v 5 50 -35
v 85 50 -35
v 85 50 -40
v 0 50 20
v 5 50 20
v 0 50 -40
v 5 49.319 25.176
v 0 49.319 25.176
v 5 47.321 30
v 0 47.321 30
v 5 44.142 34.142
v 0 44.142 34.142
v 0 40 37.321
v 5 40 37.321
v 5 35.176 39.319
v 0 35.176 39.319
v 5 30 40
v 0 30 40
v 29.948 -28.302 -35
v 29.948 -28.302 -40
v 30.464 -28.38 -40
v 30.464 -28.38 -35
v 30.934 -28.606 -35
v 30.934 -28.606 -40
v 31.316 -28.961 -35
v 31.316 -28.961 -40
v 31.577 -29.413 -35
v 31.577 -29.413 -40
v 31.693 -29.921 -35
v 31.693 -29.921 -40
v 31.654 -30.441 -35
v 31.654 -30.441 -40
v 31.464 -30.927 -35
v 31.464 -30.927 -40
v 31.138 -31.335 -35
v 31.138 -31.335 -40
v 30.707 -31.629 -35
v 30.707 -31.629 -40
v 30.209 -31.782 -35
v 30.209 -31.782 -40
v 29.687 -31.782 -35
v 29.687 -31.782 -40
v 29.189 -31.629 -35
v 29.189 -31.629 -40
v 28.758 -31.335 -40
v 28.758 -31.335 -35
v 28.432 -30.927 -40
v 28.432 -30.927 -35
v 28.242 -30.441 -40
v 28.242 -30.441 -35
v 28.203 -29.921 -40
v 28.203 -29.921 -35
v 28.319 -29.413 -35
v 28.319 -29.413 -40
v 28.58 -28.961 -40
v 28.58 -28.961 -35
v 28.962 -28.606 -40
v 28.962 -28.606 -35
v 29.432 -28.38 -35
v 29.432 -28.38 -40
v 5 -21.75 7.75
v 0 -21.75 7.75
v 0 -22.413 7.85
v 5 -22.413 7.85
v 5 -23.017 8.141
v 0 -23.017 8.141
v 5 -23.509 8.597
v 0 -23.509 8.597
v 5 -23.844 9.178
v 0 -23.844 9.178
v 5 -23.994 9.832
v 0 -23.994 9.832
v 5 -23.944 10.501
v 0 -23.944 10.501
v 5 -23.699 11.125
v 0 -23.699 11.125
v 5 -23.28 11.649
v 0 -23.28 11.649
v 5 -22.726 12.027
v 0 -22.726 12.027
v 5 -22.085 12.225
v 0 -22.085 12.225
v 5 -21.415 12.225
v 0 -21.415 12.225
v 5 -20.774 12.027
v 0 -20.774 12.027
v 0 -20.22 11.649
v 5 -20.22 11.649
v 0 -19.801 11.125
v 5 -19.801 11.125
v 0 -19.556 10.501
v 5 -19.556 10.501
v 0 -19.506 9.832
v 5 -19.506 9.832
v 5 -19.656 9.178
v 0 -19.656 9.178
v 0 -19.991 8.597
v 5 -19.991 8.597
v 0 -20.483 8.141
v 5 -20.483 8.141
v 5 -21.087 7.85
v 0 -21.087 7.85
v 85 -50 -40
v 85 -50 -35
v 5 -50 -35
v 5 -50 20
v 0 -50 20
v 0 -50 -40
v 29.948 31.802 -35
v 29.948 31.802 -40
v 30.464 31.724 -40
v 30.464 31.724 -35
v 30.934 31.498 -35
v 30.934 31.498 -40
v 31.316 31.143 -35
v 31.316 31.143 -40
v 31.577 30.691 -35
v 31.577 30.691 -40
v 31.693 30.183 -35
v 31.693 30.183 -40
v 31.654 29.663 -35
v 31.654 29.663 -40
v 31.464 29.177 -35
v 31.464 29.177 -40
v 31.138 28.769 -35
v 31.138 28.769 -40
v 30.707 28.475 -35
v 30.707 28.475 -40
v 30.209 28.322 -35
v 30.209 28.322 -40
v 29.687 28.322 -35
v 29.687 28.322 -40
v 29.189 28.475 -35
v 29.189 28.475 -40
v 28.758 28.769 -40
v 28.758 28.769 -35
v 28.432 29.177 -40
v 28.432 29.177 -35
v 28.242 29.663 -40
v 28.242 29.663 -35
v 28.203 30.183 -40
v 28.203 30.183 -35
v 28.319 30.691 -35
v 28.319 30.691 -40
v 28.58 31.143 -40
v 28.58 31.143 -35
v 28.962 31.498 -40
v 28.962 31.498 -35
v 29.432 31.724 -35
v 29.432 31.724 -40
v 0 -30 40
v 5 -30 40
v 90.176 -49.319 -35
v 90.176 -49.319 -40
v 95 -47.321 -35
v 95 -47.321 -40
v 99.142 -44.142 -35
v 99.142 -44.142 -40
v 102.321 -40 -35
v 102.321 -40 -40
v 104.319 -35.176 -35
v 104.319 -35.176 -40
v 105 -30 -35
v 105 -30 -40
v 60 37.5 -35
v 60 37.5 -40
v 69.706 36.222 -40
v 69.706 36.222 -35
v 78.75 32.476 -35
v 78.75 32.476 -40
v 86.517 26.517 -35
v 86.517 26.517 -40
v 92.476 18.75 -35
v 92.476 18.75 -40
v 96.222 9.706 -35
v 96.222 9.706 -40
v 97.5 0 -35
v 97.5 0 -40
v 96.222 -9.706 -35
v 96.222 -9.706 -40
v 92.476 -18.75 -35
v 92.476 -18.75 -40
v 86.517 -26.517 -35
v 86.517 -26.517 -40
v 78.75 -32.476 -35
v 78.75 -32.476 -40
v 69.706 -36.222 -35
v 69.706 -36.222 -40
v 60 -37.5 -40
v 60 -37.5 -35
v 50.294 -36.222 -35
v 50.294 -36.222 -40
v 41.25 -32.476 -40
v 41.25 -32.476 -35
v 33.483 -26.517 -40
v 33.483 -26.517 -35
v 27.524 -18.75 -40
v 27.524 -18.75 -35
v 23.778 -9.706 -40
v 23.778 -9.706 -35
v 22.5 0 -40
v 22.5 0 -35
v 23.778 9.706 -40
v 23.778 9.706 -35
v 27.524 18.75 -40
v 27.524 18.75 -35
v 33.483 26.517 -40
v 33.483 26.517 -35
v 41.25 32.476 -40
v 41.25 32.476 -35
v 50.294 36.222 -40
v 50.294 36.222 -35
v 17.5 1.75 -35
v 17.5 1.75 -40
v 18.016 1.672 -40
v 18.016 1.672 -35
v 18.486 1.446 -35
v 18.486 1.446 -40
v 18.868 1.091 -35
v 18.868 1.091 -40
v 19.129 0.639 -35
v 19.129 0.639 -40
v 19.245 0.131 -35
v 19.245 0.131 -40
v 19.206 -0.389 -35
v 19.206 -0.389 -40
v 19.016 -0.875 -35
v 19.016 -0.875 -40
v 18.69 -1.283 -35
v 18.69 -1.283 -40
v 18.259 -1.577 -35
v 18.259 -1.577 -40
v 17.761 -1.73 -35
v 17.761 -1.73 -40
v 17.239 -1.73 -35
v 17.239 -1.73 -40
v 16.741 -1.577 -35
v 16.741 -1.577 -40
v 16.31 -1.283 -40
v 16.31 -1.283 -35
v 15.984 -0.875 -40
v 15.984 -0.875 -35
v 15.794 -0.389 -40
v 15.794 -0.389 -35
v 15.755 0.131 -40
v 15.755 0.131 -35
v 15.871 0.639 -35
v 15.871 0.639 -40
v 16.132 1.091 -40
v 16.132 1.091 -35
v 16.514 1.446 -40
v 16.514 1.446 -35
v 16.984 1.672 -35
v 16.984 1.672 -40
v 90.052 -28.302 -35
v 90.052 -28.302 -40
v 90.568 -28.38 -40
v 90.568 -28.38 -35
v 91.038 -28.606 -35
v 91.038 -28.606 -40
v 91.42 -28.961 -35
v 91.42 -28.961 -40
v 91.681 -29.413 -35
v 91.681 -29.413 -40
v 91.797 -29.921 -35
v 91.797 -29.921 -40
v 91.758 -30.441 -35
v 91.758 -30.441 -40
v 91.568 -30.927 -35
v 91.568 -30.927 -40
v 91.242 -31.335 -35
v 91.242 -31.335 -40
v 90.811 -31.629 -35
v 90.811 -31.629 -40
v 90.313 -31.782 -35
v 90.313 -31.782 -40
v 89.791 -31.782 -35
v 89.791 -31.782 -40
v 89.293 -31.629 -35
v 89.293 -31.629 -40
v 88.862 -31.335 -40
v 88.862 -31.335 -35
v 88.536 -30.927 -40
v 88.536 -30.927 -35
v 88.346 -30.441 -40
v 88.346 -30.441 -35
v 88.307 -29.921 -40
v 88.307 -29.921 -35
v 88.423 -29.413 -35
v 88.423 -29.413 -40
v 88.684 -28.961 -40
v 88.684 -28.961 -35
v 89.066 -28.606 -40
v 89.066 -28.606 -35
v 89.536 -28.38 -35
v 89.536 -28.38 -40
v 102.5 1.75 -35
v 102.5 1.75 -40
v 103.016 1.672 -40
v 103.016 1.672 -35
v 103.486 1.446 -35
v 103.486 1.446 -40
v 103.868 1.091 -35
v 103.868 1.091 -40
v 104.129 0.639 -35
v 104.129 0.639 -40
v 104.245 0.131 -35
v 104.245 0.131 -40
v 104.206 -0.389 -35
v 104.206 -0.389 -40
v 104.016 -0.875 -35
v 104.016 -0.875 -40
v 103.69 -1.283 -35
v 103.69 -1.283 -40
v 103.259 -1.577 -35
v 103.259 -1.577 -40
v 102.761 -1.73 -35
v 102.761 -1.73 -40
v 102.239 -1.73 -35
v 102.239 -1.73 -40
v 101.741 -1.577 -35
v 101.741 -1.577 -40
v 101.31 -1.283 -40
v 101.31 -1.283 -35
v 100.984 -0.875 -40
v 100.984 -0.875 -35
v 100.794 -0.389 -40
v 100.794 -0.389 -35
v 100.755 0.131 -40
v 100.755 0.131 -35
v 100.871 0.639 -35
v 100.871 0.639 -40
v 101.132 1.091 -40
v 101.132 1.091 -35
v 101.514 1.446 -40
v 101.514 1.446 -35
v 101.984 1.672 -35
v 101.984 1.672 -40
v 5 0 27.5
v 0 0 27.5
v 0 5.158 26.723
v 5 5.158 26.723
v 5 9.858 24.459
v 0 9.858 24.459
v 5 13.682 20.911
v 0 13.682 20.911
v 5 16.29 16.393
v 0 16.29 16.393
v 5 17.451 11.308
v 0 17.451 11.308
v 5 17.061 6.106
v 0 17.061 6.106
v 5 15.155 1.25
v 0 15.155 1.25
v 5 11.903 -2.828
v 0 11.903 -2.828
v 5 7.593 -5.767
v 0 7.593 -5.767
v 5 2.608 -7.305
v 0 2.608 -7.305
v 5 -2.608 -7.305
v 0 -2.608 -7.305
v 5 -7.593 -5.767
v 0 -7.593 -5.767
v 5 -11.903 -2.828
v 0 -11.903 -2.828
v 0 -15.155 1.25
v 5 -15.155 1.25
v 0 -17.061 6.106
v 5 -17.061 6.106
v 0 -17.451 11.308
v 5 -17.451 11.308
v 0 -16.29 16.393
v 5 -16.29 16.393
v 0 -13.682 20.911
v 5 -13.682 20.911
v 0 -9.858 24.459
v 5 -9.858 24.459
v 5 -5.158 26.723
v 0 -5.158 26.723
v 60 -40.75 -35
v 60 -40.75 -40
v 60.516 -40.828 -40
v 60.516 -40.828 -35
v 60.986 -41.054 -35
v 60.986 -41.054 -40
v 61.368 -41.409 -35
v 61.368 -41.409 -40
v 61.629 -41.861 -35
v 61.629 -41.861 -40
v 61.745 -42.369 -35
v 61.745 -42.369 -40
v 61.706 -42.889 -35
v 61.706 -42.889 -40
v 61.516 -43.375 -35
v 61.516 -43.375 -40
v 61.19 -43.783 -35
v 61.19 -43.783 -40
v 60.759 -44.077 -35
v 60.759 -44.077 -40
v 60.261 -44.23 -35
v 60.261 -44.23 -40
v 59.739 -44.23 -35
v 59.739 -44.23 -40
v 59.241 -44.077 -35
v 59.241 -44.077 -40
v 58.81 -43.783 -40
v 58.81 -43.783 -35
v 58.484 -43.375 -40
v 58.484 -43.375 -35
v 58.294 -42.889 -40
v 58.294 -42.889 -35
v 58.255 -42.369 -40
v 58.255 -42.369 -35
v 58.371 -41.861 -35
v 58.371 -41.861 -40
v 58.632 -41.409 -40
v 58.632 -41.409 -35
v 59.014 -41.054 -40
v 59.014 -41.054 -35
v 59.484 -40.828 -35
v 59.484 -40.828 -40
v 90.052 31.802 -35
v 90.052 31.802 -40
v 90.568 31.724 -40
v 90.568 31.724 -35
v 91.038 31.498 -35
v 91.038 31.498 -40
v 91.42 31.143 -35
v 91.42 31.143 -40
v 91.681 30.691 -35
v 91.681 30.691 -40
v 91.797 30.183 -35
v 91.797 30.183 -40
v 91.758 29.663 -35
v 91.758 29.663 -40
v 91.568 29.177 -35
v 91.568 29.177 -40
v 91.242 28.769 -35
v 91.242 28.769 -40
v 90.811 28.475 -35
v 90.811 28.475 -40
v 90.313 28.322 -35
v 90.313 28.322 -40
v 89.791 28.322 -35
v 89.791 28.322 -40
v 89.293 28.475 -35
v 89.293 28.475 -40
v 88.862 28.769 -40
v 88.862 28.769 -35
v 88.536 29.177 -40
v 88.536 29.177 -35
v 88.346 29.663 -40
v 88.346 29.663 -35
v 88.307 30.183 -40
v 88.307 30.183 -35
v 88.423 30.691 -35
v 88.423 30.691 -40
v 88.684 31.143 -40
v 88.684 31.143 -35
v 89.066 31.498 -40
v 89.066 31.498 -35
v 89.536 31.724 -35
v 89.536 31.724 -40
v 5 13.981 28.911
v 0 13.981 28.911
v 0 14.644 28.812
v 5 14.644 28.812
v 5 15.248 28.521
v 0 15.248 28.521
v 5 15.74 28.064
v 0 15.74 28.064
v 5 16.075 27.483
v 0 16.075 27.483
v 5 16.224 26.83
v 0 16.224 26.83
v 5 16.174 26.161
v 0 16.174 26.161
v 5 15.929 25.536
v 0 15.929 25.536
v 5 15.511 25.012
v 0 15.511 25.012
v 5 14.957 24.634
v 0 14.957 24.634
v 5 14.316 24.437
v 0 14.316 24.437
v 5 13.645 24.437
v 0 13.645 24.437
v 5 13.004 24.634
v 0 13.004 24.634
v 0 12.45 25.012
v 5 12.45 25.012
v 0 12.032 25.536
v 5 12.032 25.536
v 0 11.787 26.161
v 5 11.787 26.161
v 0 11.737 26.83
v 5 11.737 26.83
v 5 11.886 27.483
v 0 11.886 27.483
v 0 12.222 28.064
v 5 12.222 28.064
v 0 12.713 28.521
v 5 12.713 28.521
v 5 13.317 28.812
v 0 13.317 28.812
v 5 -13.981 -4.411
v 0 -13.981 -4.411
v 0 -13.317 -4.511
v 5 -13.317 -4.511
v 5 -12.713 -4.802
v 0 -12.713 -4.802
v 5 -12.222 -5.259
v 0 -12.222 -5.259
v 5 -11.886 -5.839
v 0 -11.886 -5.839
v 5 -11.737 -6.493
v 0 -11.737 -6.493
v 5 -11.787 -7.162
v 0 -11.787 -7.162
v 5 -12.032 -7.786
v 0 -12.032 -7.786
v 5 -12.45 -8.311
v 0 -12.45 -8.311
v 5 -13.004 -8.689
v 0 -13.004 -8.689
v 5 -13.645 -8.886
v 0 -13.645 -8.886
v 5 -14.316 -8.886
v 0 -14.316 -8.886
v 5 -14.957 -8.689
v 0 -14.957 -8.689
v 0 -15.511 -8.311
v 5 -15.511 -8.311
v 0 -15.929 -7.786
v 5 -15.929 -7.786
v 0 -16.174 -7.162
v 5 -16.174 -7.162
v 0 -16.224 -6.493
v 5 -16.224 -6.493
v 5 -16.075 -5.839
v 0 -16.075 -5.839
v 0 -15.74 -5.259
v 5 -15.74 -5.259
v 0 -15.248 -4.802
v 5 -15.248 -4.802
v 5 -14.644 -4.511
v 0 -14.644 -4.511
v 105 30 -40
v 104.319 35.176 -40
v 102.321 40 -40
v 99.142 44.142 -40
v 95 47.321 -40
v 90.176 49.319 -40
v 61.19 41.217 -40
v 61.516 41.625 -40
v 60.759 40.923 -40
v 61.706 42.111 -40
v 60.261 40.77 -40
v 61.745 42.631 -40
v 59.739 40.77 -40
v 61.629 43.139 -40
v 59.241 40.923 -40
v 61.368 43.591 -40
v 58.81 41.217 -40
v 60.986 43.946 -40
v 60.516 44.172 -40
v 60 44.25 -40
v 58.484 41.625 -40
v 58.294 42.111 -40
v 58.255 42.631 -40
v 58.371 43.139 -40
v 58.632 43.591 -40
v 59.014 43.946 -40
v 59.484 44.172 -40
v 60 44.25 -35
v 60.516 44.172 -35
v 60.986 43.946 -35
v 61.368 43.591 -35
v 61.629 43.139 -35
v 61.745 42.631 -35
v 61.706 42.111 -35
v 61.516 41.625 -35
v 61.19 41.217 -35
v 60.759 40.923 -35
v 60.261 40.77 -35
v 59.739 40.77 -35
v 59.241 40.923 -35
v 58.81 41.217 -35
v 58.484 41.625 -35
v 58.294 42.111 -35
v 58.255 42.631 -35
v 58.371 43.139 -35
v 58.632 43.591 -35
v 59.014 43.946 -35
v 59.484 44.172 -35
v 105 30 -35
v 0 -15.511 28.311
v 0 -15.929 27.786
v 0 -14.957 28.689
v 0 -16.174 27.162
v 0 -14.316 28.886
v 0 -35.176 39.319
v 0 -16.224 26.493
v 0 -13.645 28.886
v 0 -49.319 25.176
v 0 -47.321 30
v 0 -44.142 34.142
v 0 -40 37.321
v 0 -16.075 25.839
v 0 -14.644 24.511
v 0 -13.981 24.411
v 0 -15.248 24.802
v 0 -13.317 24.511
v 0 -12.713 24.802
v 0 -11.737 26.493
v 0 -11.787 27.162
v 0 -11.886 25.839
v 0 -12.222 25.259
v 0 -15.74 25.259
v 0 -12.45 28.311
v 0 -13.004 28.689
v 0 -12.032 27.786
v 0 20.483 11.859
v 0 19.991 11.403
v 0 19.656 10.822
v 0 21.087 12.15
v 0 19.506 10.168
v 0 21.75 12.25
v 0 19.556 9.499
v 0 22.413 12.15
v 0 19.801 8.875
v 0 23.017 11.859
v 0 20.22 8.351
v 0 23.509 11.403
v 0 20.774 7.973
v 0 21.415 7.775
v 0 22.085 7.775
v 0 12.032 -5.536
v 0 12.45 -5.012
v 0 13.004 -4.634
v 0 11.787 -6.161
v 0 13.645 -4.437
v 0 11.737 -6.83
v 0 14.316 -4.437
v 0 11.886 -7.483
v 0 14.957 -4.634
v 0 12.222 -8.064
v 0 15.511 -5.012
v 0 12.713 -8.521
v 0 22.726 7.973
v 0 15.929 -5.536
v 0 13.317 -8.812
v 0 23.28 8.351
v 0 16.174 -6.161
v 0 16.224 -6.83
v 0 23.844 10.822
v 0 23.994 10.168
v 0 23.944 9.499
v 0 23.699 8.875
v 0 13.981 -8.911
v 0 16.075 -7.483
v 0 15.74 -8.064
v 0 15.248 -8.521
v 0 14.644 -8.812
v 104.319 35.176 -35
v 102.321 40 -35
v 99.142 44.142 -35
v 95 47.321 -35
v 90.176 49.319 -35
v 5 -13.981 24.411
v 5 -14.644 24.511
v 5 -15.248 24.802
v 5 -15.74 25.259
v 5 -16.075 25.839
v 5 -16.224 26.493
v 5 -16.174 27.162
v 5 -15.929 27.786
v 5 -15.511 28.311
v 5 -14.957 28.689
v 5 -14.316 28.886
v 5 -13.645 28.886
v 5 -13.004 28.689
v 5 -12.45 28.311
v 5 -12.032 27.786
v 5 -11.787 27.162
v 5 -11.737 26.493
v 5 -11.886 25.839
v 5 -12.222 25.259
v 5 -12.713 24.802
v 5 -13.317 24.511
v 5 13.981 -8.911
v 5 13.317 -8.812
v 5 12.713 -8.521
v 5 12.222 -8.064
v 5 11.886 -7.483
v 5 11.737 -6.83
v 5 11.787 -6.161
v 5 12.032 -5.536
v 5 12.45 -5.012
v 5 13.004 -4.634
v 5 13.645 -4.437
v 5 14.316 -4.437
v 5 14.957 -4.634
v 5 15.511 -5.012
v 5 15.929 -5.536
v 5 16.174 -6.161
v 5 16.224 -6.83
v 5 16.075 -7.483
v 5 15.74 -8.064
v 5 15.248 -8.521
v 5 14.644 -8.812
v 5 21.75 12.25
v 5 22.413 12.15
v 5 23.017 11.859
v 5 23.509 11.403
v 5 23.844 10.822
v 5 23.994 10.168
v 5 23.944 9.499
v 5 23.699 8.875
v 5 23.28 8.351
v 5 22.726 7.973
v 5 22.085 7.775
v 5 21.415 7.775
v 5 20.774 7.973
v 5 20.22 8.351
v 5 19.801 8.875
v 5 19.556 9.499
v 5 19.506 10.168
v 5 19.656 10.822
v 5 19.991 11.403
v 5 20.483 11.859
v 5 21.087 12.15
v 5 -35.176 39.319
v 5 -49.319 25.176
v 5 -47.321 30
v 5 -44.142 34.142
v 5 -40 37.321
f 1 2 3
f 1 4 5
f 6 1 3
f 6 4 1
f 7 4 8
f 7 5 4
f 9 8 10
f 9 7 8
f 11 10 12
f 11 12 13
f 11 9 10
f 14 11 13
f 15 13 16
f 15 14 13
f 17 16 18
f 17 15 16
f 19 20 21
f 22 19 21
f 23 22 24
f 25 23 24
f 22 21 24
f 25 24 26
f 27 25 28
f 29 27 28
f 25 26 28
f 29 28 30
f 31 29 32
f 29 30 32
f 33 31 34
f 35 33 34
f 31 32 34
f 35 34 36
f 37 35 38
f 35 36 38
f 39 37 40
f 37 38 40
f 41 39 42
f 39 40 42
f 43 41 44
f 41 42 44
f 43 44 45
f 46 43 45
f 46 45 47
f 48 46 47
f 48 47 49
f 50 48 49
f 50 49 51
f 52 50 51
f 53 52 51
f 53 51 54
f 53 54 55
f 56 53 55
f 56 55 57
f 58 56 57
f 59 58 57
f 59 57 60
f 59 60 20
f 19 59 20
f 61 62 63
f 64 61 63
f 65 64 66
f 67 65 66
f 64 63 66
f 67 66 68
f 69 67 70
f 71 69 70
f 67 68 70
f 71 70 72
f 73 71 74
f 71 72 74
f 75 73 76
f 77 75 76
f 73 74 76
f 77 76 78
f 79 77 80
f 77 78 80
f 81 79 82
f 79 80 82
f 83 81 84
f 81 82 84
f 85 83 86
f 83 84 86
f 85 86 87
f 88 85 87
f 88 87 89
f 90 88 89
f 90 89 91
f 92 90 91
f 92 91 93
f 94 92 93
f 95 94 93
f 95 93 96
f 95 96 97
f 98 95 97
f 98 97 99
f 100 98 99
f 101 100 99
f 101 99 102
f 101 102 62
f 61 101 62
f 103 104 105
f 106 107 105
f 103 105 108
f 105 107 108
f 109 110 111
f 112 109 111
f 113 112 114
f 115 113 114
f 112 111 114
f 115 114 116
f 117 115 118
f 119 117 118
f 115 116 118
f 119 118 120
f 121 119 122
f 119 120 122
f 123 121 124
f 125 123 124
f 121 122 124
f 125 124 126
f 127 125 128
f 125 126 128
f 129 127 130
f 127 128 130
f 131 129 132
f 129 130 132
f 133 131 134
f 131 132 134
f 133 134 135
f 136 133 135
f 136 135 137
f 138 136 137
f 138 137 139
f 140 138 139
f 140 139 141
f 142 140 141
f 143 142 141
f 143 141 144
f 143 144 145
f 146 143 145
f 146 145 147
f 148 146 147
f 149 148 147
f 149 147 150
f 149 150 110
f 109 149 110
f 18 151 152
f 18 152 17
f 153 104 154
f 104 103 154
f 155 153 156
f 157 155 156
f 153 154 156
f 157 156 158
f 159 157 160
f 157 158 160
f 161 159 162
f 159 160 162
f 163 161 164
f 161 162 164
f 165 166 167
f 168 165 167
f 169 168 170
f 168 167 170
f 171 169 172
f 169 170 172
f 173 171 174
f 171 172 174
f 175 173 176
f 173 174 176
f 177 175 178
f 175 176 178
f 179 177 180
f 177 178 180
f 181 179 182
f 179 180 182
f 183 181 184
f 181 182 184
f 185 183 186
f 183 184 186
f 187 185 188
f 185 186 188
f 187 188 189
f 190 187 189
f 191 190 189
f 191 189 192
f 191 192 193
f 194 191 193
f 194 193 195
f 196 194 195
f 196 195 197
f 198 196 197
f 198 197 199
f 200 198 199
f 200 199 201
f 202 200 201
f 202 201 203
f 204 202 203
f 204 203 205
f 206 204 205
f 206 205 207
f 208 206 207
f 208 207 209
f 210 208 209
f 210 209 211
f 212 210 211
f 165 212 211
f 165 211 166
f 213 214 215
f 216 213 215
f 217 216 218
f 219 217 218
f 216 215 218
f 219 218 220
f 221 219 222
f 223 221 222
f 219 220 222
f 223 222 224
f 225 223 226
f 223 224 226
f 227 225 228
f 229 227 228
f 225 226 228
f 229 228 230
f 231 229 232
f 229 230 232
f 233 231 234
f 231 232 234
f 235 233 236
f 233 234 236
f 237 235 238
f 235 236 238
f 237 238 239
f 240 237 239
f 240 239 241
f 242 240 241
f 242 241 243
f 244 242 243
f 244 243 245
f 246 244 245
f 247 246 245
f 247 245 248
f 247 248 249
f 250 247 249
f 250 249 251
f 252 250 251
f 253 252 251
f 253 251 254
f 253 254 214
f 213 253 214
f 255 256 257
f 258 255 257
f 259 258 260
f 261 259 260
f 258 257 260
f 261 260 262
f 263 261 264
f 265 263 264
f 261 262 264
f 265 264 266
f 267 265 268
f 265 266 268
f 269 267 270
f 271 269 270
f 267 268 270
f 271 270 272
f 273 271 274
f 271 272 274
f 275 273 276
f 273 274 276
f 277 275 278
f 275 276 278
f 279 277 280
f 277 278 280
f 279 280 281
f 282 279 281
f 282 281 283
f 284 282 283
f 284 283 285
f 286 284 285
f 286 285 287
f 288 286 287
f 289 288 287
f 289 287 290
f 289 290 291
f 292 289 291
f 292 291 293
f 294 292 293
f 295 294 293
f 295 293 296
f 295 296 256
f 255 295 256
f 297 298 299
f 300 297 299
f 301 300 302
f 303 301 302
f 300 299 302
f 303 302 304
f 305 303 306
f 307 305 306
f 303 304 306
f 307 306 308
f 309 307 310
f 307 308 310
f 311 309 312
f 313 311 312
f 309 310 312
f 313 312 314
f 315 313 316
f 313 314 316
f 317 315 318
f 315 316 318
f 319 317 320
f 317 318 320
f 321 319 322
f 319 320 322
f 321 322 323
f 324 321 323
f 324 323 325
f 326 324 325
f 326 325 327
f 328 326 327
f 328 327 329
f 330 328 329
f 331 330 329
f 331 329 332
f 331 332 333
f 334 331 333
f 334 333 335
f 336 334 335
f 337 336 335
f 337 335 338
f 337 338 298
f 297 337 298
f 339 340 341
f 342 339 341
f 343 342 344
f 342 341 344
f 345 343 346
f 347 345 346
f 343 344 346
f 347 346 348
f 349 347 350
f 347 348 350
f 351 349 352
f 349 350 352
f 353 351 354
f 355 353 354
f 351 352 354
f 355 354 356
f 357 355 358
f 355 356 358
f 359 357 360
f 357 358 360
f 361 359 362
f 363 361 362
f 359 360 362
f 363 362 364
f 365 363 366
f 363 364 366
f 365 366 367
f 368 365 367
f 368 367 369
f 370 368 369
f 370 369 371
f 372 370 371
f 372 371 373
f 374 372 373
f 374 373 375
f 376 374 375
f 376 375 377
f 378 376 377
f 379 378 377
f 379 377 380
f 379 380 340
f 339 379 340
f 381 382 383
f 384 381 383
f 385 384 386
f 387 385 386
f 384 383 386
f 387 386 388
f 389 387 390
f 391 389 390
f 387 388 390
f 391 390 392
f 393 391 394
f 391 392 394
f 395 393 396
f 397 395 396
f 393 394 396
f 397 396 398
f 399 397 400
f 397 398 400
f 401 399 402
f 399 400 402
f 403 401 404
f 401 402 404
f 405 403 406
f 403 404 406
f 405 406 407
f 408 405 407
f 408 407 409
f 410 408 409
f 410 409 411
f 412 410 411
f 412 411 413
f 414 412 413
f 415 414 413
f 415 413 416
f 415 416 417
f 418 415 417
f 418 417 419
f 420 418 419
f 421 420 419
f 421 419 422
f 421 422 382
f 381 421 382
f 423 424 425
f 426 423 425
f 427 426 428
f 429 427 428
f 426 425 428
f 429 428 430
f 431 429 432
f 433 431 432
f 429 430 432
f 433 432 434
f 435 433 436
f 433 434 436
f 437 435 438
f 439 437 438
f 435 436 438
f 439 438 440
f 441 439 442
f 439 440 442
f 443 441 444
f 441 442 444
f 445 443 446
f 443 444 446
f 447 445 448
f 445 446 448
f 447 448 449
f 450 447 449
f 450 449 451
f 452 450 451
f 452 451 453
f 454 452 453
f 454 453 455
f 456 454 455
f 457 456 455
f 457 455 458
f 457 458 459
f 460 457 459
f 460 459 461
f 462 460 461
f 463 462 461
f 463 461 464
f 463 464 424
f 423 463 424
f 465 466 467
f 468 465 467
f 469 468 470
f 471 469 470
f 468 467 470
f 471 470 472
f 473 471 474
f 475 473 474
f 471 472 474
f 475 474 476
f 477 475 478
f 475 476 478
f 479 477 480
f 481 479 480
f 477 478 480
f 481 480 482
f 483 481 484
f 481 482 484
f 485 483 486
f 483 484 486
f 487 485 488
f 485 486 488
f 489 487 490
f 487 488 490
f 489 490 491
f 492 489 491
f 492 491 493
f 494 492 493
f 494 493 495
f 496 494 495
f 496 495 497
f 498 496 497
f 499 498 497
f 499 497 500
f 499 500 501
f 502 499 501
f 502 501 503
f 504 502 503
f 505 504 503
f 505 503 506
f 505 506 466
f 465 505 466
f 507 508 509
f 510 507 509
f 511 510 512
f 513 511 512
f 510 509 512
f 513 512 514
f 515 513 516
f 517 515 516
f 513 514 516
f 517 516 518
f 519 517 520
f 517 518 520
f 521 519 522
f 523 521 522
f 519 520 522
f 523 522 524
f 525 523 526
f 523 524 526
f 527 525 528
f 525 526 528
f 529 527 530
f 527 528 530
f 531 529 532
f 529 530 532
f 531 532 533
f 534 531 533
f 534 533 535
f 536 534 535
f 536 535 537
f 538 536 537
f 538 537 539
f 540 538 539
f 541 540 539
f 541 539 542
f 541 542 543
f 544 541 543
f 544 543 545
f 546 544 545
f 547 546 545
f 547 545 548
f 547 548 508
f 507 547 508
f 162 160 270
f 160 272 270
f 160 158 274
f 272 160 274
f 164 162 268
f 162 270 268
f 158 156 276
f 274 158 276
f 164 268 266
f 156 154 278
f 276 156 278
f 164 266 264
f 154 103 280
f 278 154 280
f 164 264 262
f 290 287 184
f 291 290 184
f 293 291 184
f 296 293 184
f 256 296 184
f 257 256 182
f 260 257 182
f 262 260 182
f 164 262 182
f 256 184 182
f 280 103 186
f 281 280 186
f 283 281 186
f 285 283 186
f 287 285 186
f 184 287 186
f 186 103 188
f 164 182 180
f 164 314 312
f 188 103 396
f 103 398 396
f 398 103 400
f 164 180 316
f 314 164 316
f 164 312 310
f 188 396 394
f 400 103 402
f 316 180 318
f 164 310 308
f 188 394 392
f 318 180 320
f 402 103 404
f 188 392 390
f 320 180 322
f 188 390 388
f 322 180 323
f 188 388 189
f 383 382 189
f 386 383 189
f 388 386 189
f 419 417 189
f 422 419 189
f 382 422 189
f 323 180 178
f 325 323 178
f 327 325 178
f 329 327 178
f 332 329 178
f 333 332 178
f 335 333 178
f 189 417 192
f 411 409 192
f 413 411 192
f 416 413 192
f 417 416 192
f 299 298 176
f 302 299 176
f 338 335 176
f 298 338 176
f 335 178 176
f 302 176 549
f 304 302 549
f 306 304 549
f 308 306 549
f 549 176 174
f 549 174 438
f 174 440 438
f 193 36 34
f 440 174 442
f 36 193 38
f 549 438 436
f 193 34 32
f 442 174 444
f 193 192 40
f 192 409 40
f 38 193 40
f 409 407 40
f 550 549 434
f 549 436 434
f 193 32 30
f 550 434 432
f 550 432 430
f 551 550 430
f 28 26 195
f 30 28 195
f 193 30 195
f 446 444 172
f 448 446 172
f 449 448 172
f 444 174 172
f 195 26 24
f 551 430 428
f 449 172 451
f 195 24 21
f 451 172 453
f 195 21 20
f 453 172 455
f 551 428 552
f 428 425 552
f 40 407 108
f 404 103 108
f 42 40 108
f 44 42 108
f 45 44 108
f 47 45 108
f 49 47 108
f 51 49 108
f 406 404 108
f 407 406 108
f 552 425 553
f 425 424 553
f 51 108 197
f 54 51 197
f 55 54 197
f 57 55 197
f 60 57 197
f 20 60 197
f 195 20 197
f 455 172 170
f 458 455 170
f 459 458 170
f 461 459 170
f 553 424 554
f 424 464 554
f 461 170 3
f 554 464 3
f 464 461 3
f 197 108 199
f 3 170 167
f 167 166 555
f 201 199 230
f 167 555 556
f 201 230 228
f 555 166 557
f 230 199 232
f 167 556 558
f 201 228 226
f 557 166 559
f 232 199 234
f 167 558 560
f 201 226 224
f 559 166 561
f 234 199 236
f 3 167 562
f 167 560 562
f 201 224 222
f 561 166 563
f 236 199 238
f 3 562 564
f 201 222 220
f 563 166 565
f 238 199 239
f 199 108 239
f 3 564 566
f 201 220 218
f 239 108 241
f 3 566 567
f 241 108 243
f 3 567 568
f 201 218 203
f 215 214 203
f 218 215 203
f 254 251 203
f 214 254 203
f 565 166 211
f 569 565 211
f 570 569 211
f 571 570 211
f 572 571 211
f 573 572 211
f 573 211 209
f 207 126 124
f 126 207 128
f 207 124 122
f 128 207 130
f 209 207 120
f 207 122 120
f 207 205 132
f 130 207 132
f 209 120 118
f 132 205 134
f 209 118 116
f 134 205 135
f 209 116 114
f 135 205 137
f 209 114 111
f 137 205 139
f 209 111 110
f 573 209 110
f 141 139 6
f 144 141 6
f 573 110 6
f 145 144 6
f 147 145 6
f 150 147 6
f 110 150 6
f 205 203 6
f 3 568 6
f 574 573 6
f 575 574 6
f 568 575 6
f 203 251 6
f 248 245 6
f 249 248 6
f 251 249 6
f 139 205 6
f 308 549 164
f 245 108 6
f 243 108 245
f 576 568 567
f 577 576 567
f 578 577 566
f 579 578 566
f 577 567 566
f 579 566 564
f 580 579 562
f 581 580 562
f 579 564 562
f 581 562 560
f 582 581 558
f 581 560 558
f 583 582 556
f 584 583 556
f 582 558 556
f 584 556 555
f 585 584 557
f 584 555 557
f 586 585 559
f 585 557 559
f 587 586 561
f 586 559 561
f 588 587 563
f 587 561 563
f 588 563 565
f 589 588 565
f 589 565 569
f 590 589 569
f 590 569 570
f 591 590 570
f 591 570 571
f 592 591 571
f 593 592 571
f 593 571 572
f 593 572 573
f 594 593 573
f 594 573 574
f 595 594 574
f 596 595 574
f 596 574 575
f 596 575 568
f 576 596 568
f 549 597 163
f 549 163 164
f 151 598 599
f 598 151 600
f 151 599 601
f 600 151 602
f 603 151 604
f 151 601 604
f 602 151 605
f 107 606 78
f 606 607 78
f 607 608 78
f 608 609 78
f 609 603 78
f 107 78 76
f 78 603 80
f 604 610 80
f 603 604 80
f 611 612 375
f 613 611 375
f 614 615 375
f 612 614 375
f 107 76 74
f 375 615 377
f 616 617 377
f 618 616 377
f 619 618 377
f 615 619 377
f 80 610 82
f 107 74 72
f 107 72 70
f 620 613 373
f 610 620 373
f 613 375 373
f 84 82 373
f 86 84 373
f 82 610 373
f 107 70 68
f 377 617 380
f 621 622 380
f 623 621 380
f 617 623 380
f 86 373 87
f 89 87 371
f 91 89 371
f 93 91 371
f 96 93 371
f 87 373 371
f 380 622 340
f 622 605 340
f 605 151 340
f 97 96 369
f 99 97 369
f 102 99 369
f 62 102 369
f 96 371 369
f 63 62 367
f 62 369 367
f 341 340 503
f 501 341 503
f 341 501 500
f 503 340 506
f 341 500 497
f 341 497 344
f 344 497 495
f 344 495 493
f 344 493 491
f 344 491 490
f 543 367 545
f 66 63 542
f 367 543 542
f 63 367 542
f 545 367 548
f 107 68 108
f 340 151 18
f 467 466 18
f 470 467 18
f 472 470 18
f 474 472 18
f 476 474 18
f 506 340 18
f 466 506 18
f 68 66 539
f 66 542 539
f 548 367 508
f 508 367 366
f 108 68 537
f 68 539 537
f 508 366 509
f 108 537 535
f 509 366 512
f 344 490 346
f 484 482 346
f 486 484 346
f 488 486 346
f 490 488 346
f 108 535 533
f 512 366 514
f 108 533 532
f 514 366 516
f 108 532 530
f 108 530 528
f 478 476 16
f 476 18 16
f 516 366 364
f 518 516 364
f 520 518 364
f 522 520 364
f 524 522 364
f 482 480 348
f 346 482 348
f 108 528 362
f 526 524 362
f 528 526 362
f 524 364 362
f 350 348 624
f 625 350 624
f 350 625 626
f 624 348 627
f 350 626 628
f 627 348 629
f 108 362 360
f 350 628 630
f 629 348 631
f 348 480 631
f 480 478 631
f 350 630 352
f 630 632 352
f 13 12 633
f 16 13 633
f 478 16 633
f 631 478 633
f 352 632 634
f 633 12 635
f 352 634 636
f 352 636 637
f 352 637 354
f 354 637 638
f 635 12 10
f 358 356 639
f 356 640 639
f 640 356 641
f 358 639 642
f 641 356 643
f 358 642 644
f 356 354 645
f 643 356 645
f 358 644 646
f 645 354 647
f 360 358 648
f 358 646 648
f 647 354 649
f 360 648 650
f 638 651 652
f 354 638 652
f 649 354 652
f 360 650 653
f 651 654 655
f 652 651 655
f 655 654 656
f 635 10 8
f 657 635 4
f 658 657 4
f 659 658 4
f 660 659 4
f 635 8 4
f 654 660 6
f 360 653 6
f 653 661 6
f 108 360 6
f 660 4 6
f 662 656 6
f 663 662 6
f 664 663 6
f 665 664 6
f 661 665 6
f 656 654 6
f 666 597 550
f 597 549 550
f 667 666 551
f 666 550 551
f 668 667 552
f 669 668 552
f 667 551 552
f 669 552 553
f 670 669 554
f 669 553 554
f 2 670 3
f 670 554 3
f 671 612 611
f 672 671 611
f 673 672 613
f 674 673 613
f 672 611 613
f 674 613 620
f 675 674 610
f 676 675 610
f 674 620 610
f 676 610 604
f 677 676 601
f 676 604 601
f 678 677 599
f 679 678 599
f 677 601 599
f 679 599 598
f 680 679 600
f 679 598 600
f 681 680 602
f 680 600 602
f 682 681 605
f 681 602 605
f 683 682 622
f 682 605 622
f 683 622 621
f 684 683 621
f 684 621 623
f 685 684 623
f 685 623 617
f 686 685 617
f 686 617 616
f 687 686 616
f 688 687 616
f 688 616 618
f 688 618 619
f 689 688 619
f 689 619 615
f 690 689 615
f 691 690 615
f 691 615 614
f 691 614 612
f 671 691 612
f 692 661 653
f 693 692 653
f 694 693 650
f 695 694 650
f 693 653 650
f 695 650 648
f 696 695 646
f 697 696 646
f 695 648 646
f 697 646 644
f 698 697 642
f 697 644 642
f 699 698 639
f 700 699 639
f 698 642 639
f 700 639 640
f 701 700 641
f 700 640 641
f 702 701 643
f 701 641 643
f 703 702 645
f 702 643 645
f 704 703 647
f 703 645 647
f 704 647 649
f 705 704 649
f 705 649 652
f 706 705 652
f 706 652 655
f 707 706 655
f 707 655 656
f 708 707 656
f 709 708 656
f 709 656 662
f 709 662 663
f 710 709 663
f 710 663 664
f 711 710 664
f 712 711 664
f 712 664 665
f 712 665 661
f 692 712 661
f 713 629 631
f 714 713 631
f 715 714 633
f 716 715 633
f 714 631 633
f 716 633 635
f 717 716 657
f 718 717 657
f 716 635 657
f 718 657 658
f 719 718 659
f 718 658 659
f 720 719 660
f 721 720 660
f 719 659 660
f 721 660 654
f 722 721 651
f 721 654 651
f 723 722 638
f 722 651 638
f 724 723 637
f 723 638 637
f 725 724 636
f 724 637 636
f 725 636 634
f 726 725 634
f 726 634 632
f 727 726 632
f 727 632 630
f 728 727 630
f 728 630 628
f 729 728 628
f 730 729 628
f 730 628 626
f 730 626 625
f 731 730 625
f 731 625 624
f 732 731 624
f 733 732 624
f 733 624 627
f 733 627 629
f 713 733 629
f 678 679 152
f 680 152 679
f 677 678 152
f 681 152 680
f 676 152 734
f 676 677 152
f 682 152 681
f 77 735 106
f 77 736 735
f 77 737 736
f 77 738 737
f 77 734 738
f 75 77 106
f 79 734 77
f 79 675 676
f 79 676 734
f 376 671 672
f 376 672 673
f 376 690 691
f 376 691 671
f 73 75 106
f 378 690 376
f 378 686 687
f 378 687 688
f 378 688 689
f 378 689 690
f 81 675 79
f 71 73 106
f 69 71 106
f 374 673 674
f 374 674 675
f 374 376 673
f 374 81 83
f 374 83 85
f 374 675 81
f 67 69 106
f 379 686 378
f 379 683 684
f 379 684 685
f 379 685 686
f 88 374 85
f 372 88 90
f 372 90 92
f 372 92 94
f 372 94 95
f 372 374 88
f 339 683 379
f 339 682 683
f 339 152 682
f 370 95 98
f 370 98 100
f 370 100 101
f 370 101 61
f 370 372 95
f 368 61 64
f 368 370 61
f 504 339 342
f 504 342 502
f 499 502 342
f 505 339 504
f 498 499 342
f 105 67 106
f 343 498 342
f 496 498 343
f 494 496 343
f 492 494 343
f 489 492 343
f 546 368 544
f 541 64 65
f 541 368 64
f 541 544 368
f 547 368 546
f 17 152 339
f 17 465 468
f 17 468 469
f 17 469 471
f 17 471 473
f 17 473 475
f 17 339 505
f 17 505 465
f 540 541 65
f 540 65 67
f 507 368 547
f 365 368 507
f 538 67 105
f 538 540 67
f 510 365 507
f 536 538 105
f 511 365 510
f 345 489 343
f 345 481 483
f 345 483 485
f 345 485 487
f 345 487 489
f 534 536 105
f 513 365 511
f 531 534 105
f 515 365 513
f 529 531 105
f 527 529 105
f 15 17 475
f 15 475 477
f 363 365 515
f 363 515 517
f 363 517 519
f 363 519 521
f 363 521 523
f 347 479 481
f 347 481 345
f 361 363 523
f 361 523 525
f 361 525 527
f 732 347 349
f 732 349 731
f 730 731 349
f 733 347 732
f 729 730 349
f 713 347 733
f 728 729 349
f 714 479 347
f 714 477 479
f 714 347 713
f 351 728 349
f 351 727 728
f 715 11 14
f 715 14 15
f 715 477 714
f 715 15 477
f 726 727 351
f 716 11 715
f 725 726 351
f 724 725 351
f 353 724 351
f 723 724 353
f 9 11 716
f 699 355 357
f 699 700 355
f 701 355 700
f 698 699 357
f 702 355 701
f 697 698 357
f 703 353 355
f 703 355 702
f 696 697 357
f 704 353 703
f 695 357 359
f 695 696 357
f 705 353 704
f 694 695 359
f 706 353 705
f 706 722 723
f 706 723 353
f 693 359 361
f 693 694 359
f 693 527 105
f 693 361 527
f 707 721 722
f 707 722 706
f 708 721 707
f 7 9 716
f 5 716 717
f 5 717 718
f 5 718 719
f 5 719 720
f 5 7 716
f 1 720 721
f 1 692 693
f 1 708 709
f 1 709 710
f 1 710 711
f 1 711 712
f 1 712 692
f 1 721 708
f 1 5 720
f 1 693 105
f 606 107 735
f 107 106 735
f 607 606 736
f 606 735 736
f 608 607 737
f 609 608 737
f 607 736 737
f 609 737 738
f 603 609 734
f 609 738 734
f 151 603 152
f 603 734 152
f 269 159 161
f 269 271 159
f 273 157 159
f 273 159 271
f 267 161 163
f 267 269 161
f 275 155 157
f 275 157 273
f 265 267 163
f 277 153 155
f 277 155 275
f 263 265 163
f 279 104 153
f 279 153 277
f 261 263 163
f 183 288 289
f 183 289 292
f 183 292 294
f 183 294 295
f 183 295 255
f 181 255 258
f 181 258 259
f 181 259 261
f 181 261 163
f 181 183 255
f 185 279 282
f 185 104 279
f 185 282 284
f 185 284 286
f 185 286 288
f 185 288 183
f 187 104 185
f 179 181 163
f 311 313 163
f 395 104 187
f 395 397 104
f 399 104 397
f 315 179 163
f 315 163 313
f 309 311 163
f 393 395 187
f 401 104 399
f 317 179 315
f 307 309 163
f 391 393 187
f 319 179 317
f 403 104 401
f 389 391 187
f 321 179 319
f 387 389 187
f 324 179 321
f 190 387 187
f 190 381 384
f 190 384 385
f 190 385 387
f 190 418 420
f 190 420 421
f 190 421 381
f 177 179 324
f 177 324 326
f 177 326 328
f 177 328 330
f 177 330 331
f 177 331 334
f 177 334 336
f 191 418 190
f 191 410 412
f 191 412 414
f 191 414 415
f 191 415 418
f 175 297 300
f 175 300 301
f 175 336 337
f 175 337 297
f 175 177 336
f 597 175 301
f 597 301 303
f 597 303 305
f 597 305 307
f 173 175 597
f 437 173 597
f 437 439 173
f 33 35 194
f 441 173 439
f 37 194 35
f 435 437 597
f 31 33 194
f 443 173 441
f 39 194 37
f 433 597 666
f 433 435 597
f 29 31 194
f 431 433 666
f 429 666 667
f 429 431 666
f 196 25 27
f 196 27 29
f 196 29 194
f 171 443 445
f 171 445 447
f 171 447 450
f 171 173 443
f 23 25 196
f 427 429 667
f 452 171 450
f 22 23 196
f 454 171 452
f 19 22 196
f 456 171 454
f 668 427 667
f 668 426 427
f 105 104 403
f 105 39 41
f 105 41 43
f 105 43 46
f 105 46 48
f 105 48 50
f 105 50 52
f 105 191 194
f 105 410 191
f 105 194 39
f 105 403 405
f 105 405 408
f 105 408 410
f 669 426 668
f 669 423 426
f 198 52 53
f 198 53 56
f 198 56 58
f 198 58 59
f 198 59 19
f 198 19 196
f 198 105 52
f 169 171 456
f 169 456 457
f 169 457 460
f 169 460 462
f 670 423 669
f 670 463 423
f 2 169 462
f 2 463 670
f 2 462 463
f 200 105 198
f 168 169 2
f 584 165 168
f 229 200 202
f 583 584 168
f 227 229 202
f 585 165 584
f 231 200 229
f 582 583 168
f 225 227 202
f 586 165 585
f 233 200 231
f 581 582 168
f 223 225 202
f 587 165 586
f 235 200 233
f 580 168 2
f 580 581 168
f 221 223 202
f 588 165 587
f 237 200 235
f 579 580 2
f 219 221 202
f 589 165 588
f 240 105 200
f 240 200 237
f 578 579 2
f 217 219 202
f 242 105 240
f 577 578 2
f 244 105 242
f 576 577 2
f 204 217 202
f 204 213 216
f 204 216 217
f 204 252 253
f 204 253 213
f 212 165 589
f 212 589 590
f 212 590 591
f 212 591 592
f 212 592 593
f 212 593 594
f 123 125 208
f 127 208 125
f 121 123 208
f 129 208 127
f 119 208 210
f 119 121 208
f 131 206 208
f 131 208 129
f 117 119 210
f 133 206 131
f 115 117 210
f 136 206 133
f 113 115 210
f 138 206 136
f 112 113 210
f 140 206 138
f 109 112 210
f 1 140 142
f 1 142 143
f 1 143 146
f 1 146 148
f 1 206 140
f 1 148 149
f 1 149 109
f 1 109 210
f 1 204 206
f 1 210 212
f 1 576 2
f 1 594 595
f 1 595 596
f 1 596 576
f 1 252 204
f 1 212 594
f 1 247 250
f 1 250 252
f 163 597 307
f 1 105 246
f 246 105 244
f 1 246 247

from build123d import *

# Parameters (mm, degrees)
SKETCH_1_W          = 80
SKETCH_1_H          = 100
EXTRUDE_1_DEPTH     = 5
SKETCH_3_W          = 5
SKETCH_3_H          = 100
EXTRUDE_2_DEPTH     = 100
SKETCH_4_R          = 2.25
SKETCH_4_R_2        = 17.5
CUT_EXTRUDE_1_DEPTH = 100
SKETCH_5_R          = 1.75
SKETCH_5_R_2        = 37.5
CUT_EXTRUDE_2_DEPTH = 22
FILLET_1_R          = 20


with BuildPart() as part:
    # 草图1 → 凸台-拉伸1 (new body)
    with BuildSketch(Plane(origin=(0, 0, 0), x_dir=(0, 0, -1), z_dir=(1, 0, 0))):
        Rectangle(SKETCH_1_W, SKETCH_1_H)
    extrude(amount=EXTRUDE_1_DEPTH)

    # 草图3 → 凸台-拉伸2 (add)
    with BuildSketch(Plane(origin=(5, 0, 0), x_dir=(0, 0, -1), z_dir=(1, 0, 0))):
        with Locations((37.5, 0)):
            Rectangle(SKETCH_3_W, SKETCH_3_H)
    extrude(amount=EXTRUDE_2_DEPTH)

    # 草图4 → 切除-拉伸1 (cut)
    with BuildSketch(Plane.ZY):
        with Locations((10, 21.75)):
            Circle(SKETCH_4_R)
        with Locations((26.661466638, 13.980630511)):
            Circle(SKETCH_4_R)
        with Locations(Location((-6.661466638, 13.980630511, 0), (0, 0, 180))):
            Circle(SKETCH_4_R)
        with Locations(Location((10, -21.75, 0), (0, 0, 180))):
            Circle(SKETCH_4_R)
        with Locations(Location((26.661466638, -13.980630511, 0), (0, 0, 180))):
            Circle(SKETCH_4_R)
        with Locations((-6.661466638, -13.980630511)):
            Circle(SKETCH_4_R)
        with Locations((10, 0)):
            Circle(SKETCH_4_R_2)
    extrude(amount=-CUT_EXTRUDE_1_DEPTH, mode=Mode.SUBTRACT)

    # 草图5 → 切除-拉伸2 (cut)
    with BuildSketch(Plane(origin=(0, 0, -40), x_dir=(-1, 0, 0), z_dir=(0, 0, -1))):
        with Locations(Location((-60, 42.5, 0), (0, 0, 90))):
            Circle(SKETCH_5_R)
        with Locations(Location((-29.9479618, 30.0520382, 0), (0, 0, 90))):
            Circle(SKETCH_5_R)
        with Locations(Location((-17.5, 0, 0), (0, 0, 90))):
            Circle(SKETCH_5_R)
        with Locations(Location((-29.9479618, -30.0520382, 0), (0, 0, 90))):
            Circle(SKETCH_5_R)
        with Locations(Location((-60, -42.5, 0), (0, 0, 90))):
            Circle(SKETCH_5_R)
        with Locations(Location((-90.0520382, -30.0520382, 0), (0, 0, 90))):
            Circle(SKETCH_5_R)
        with Locations(Location((-102.5, 0, 0), (0, 0, 90))):
            Circle(SKETCH_5_R)
        with Locations(Location((-90.0520382, 30.0520382, 0), (0, 0, 90))):
            Circle(SKETCH_5_R)
        with Locations(Location((-60, 0, 0), (0, 0, 90))):
            Circle(SKETCH_5_R_2)
    extrude(amount=-CUT_EXTRUDE_2_DEPTH, mode=Mode.SUBTRACT)

    # 圆角1
    fillet_1_edges = [part.edges().sort_by_distance(p)[0] for p in [
        (105, 50, -37.5),
        (105, -50, -37.5),
        (2.5, 50, 40),
        (2.5, -50, 40),
    ]]
    fillet(fillet_1_edges, radius=FILLET_1_R)


solid = part.part
